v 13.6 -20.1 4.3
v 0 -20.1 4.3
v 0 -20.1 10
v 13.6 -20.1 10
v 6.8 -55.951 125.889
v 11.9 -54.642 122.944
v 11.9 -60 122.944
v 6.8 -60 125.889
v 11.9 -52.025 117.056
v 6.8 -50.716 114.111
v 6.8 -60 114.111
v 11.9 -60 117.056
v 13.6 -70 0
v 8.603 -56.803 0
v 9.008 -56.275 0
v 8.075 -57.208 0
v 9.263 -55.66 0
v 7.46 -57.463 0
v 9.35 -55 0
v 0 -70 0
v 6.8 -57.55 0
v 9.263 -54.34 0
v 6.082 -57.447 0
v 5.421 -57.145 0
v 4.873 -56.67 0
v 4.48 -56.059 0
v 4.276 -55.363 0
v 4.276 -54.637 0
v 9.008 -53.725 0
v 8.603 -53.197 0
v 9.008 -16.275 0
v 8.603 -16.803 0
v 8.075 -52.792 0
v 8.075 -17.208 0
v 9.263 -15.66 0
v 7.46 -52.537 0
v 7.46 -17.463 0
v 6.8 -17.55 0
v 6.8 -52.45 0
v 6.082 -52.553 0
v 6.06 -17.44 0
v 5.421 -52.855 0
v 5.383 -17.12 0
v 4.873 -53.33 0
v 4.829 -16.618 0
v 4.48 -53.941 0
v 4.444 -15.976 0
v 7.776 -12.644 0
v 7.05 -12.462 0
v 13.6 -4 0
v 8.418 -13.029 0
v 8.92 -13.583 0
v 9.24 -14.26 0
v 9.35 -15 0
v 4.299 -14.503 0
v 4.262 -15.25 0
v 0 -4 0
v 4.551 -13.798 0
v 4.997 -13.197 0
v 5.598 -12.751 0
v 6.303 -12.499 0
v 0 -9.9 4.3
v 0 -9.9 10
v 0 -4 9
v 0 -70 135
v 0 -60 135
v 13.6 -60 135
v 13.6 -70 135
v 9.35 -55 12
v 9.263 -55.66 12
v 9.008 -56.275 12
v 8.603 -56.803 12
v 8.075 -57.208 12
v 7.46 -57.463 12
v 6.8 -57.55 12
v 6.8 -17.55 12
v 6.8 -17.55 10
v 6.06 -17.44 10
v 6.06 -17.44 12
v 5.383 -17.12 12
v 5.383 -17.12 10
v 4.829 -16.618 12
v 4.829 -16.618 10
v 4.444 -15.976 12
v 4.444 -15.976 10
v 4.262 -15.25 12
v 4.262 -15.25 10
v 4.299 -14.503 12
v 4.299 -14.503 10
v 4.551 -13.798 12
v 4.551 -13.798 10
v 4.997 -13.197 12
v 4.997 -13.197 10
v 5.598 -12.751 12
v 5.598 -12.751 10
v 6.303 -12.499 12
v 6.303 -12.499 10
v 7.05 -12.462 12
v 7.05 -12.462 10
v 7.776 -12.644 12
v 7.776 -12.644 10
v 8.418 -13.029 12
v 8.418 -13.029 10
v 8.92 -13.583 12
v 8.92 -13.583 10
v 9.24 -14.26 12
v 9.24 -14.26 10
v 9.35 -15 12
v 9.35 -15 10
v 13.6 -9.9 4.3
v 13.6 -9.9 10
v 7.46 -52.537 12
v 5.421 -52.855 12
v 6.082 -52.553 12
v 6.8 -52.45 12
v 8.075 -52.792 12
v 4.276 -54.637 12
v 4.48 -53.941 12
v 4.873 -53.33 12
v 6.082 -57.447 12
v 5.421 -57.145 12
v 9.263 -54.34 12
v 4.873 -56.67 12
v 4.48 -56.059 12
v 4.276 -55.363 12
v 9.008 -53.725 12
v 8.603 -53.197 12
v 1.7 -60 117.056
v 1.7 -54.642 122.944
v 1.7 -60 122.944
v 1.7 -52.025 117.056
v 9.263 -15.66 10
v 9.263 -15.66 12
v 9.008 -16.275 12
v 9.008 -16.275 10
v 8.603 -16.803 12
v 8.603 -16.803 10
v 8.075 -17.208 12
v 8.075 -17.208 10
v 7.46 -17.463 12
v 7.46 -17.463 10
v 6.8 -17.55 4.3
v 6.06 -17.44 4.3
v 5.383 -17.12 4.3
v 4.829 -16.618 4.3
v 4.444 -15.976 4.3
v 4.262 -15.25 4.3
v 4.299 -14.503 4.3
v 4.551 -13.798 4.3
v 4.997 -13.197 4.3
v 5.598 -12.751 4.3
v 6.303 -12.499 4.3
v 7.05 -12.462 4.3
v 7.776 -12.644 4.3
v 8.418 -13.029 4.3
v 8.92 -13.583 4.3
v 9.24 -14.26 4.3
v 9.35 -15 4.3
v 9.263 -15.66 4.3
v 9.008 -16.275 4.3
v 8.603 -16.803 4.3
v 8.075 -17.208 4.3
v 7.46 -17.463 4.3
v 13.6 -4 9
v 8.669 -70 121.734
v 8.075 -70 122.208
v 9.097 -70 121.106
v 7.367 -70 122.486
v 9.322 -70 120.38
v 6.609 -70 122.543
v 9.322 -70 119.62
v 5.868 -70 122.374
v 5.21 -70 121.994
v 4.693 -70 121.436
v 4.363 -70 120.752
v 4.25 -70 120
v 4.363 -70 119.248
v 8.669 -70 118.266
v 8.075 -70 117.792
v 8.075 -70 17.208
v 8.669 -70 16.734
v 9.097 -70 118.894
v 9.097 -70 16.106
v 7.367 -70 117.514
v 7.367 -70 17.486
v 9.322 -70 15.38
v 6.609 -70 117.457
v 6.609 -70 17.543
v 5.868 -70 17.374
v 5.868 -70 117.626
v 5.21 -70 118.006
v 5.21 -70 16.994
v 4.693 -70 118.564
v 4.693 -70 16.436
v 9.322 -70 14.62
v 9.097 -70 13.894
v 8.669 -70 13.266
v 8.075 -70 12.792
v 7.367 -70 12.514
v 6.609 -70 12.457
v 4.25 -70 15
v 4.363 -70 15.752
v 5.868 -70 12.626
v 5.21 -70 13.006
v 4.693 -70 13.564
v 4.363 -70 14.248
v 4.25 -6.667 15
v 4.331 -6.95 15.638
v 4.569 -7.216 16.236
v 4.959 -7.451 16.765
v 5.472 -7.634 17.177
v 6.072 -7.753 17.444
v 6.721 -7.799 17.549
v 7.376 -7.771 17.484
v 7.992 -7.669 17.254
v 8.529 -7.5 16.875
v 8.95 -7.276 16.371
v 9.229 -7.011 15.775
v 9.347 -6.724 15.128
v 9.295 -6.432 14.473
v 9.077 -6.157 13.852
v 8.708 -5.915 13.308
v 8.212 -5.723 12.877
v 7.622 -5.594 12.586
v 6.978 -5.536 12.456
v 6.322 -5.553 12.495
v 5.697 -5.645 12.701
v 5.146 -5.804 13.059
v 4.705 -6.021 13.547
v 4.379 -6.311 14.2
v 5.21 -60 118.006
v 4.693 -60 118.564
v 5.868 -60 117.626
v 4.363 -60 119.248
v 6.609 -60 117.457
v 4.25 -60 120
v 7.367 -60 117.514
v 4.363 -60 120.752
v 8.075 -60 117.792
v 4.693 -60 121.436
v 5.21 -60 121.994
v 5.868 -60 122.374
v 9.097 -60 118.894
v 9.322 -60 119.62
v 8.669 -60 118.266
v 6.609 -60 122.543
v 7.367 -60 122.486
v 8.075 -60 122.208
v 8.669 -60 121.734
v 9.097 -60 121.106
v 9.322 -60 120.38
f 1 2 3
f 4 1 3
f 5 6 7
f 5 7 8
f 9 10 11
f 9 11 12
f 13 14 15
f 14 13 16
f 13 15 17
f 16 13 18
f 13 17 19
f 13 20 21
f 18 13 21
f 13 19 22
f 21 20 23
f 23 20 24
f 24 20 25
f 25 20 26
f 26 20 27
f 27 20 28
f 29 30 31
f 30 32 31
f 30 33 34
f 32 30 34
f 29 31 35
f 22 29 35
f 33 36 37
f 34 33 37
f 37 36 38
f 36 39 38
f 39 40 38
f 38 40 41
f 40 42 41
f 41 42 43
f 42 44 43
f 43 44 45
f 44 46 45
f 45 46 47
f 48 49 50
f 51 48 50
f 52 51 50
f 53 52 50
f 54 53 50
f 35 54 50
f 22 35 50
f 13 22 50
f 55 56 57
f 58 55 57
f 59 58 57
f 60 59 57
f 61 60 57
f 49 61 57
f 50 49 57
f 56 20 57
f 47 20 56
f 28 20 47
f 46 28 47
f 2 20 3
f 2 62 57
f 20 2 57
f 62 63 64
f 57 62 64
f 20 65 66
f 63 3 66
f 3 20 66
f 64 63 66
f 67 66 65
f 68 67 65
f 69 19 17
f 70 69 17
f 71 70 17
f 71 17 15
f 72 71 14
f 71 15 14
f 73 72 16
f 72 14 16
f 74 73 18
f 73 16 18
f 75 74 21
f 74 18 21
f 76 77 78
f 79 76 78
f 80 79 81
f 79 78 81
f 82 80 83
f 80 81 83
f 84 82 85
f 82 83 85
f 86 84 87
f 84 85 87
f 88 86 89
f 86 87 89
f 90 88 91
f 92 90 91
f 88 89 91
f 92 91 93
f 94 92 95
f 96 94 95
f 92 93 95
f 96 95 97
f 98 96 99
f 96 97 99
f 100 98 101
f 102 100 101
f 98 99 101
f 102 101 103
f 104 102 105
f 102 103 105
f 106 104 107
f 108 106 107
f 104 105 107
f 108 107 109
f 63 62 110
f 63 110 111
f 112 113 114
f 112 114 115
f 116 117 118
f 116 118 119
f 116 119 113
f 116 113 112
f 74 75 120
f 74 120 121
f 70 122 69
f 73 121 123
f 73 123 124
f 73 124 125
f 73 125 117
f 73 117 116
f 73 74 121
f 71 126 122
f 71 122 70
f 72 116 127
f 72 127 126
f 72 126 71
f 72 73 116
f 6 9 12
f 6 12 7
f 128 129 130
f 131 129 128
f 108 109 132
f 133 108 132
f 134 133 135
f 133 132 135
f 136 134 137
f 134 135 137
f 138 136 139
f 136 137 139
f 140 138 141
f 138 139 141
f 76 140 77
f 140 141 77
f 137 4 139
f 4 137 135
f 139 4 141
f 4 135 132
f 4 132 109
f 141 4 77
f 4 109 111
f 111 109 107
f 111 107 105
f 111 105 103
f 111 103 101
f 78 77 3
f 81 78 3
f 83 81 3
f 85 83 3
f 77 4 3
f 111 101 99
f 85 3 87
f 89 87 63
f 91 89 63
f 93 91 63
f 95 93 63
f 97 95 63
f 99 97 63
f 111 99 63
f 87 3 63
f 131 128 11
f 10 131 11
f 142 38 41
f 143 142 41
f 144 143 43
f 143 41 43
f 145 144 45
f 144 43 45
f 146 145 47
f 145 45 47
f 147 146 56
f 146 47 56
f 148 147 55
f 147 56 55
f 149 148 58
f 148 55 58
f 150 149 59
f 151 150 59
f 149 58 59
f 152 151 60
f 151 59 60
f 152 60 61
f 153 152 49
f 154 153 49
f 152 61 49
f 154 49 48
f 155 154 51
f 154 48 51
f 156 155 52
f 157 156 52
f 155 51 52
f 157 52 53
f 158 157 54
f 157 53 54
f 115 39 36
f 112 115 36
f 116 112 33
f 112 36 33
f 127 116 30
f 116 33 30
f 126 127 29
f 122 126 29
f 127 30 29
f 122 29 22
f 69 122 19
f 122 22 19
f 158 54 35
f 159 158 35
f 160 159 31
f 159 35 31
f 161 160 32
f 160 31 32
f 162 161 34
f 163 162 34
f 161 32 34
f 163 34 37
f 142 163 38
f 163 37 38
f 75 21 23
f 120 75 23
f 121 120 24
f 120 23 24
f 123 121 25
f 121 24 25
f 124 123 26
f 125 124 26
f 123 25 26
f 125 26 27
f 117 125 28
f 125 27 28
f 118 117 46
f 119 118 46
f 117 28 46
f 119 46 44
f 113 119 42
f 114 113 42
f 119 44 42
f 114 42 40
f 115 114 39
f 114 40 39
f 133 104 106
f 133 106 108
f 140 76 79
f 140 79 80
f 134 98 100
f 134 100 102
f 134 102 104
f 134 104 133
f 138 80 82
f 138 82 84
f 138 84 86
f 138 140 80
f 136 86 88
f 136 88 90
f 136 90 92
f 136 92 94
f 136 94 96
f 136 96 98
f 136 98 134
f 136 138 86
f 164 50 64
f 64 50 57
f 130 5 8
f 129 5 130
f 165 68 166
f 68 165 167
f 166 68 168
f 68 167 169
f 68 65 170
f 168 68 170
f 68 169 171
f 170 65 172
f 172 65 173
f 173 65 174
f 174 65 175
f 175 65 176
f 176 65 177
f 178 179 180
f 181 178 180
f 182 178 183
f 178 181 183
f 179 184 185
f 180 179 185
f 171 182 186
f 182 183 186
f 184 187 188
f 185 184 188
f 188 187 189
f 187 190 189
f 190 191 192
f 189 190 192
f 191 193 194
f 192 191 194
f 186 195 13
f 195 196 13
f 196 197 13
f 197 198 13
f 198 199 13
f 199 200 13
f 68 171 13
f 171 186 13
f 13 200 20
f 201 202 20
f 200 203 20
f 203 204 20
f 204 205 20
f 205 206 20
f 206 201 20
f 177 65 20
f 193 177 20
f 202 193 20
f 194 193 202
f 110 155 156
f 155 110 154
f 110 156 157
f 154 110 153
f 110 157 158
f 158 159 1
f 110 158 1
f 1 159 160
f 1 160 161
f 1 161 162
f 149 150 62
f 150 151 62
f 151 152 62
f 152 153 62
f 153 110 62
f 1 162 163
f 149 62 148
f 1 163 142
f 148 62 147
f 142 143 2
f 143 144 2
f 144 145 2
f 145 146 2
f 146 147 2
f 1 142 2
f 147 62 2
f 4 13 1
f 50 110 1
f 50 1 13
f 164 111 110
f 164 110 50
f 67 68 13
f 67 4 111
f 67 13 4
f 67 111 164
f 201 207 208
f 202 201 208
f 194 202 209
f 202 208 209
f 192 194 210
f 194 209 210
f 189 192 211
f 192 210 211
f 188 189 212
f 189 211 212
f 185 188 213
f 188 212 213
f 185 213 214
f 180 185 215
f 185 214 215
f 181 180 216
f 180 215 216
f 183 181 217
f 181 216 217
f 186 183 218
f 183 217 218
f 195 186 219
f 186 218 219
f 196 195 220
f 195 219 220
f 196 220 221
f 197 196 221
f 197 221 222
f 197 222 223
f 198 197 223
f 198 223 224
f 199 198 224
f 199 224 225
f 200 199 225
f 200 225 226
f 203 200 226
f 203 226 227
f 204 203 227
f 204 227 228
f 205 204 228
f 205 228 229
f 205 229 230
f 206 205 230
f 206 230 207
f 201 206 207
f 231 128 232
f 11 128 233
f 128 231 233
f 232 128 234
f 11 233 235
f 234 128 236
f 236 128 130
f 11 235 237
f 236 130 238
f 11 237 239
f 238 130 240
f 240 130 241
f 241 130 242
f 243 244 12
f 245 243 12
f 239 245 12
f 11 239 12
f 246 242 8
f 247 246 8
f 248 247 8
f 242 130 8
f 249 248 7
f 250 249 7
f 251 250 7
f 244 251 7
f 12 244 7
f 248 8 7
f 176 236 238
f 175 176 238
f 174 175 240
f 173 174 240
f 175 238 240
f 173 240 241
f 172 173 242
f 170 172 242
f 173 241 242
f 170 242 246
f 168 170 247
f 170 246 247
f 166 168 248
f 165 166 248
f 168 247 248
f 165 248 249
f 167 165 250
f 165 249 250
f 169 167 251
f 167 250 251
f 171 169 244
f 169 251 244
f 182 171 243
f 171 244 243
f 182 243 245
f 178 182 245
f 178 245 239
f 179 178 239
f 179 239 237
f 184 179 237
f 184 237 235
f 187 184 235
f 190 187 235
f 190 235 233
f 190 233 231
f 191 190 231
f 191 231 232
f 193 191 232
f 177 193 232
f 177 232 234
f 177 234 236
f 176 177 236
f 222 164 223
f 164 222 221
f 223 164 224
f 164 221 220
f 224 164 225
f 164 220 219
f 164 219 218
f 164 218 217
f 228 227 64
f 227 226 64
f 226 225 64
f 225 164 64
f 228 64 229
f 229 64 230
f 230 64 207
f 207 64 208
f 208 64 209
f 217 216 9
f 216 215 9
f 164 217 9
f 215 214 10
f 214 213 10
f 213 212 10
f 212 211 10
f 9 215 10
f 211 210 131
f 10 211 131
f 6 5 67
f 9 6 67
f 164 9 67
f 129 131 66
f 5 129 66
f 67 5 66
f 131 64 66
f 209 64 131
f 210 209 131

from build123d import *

# Parameters (mm, degrees)
F1_DEPTH  = 13.6
F3_D      = 5.1
F5_DEPTH  = 12
F6_DEPTH  = 25
F7_DEPTH  = 15
F8_D      = 5.1
F9_W      = 5.1
F9_H      = 5.7
F10_DEPTH = 25
F4_W      = 6.8
F4_H      = 4
F11_DEPTH = 25


# Not quite as in the source:
# - a feature names something its author has since deleted; it is built from what else it names


with BuildPart() as f1:
    # F0 (on Right) → F1 (new body)
    with BuildSketch(Plane.YZ):
        Polygon((-70, 0), (0, 0), (-60, 135), (-70, 135), align=None)
    extrude(amount=F1_DEPTH)

    # F3 (through all)
    with Locations(Plane.XZ.offset(70)):
        with Locations((6.8, 15), (6.8, 120)):
            Hole(F3_D / 2)

    # F4 (on face) → F5 (cut)
    with BuildSketch(Plane(origin=(0, 0, 0), x_dir=(1, 0, 0), z_dir=(0, 0, -1))):
        with BuildLine():
            ThreePointArc((9.35, 55), (8.603122292, 56.803122292), (6.8, 57.55))
            Line((6.8, 57.55), (6.8, 55))
            Line((6.8, 55), (6.8, 52.45))
            ThreePointArc((6.8, 52.45), (8.603122292, 53.196877708), (9.35, 55))
        make_face()
        with BuildLine():
            ThreePointArc((9.35, 15), (8.603122292, 16.803122292), (6.8, 17.55))
            ThreePointArc((6.8, 17.55), (4.996877708, 13.196877708), (9.35, 15))
        make_face()
        with BuildLine():
            Line((6.8, 55), (6.8, 57.55))
            ThreePointArc((6.8, 57.55), (4.25, 55), (6.8, 52.45))
            Line((6.8, 52.45), (6.8, 55))
        make_face()
    extrude(amount=-F5_DEPTH, mode=Mode.SUBTRACT)

    # F2 (on face) → F6 (join)
    with BuildSketch(Plane.XZ.offset(70)):
        Polygon((11.9, 122.9444863729), (6.8, 125.8889727457), (1.7, 122.9444863729), (1.7, 117.0555136271), (6.8, 114.1110272543), (11.9, 117.0555136271), align=None)
    extrude(amount=-F6_DEPTH)

    # F7 (cut): a face of the model
    f7_faces = [f1.faces().sort_by_distance(p)[0] for p in [
        (6.8, -45, 120),
    ]]
    extrude(f7_faces, amount=-F7_DEPTH, mode=Mode.SUBTRACT)

    # F8 (through all)
    with Locations(Plane.XZ.offset(70)):
        with Locations((6.8, 120)):
            Hole(F8_D / 2)

    # F9 (on face) → F10 (cut)
    with BuildSketch(Plane(origin=(0, 0, 0), x_dir=(0, -1, 0), z_dir=(-1, 0, 0))):
        with Locations((12.45, 7.15)):
            Rectangle(F9_W, F9_H)
        with Locations((17.55, 7.15)):
            Rectangle(F9_W, F9_H)
    extrude(amount=-F10_DEPTH, mode=Mode.SUBTRACT)

    # F4 (on face) → F11 (cut)
    with BuildSketch(Plane(origin=(0, 0, 0), x_dir=(1, 0, 0), z_dir=(0, 0, -1))):
        with Locations((10.2, 2)):
            Rectangle(F4_W, F4_H)
        with Locations((3.4, 2)):
            Rectangle(F4_W, F4_H)
    extrude(amount=-F11_DEPTH, mode=Mode.SUBTRACT)


solid = f1.part
